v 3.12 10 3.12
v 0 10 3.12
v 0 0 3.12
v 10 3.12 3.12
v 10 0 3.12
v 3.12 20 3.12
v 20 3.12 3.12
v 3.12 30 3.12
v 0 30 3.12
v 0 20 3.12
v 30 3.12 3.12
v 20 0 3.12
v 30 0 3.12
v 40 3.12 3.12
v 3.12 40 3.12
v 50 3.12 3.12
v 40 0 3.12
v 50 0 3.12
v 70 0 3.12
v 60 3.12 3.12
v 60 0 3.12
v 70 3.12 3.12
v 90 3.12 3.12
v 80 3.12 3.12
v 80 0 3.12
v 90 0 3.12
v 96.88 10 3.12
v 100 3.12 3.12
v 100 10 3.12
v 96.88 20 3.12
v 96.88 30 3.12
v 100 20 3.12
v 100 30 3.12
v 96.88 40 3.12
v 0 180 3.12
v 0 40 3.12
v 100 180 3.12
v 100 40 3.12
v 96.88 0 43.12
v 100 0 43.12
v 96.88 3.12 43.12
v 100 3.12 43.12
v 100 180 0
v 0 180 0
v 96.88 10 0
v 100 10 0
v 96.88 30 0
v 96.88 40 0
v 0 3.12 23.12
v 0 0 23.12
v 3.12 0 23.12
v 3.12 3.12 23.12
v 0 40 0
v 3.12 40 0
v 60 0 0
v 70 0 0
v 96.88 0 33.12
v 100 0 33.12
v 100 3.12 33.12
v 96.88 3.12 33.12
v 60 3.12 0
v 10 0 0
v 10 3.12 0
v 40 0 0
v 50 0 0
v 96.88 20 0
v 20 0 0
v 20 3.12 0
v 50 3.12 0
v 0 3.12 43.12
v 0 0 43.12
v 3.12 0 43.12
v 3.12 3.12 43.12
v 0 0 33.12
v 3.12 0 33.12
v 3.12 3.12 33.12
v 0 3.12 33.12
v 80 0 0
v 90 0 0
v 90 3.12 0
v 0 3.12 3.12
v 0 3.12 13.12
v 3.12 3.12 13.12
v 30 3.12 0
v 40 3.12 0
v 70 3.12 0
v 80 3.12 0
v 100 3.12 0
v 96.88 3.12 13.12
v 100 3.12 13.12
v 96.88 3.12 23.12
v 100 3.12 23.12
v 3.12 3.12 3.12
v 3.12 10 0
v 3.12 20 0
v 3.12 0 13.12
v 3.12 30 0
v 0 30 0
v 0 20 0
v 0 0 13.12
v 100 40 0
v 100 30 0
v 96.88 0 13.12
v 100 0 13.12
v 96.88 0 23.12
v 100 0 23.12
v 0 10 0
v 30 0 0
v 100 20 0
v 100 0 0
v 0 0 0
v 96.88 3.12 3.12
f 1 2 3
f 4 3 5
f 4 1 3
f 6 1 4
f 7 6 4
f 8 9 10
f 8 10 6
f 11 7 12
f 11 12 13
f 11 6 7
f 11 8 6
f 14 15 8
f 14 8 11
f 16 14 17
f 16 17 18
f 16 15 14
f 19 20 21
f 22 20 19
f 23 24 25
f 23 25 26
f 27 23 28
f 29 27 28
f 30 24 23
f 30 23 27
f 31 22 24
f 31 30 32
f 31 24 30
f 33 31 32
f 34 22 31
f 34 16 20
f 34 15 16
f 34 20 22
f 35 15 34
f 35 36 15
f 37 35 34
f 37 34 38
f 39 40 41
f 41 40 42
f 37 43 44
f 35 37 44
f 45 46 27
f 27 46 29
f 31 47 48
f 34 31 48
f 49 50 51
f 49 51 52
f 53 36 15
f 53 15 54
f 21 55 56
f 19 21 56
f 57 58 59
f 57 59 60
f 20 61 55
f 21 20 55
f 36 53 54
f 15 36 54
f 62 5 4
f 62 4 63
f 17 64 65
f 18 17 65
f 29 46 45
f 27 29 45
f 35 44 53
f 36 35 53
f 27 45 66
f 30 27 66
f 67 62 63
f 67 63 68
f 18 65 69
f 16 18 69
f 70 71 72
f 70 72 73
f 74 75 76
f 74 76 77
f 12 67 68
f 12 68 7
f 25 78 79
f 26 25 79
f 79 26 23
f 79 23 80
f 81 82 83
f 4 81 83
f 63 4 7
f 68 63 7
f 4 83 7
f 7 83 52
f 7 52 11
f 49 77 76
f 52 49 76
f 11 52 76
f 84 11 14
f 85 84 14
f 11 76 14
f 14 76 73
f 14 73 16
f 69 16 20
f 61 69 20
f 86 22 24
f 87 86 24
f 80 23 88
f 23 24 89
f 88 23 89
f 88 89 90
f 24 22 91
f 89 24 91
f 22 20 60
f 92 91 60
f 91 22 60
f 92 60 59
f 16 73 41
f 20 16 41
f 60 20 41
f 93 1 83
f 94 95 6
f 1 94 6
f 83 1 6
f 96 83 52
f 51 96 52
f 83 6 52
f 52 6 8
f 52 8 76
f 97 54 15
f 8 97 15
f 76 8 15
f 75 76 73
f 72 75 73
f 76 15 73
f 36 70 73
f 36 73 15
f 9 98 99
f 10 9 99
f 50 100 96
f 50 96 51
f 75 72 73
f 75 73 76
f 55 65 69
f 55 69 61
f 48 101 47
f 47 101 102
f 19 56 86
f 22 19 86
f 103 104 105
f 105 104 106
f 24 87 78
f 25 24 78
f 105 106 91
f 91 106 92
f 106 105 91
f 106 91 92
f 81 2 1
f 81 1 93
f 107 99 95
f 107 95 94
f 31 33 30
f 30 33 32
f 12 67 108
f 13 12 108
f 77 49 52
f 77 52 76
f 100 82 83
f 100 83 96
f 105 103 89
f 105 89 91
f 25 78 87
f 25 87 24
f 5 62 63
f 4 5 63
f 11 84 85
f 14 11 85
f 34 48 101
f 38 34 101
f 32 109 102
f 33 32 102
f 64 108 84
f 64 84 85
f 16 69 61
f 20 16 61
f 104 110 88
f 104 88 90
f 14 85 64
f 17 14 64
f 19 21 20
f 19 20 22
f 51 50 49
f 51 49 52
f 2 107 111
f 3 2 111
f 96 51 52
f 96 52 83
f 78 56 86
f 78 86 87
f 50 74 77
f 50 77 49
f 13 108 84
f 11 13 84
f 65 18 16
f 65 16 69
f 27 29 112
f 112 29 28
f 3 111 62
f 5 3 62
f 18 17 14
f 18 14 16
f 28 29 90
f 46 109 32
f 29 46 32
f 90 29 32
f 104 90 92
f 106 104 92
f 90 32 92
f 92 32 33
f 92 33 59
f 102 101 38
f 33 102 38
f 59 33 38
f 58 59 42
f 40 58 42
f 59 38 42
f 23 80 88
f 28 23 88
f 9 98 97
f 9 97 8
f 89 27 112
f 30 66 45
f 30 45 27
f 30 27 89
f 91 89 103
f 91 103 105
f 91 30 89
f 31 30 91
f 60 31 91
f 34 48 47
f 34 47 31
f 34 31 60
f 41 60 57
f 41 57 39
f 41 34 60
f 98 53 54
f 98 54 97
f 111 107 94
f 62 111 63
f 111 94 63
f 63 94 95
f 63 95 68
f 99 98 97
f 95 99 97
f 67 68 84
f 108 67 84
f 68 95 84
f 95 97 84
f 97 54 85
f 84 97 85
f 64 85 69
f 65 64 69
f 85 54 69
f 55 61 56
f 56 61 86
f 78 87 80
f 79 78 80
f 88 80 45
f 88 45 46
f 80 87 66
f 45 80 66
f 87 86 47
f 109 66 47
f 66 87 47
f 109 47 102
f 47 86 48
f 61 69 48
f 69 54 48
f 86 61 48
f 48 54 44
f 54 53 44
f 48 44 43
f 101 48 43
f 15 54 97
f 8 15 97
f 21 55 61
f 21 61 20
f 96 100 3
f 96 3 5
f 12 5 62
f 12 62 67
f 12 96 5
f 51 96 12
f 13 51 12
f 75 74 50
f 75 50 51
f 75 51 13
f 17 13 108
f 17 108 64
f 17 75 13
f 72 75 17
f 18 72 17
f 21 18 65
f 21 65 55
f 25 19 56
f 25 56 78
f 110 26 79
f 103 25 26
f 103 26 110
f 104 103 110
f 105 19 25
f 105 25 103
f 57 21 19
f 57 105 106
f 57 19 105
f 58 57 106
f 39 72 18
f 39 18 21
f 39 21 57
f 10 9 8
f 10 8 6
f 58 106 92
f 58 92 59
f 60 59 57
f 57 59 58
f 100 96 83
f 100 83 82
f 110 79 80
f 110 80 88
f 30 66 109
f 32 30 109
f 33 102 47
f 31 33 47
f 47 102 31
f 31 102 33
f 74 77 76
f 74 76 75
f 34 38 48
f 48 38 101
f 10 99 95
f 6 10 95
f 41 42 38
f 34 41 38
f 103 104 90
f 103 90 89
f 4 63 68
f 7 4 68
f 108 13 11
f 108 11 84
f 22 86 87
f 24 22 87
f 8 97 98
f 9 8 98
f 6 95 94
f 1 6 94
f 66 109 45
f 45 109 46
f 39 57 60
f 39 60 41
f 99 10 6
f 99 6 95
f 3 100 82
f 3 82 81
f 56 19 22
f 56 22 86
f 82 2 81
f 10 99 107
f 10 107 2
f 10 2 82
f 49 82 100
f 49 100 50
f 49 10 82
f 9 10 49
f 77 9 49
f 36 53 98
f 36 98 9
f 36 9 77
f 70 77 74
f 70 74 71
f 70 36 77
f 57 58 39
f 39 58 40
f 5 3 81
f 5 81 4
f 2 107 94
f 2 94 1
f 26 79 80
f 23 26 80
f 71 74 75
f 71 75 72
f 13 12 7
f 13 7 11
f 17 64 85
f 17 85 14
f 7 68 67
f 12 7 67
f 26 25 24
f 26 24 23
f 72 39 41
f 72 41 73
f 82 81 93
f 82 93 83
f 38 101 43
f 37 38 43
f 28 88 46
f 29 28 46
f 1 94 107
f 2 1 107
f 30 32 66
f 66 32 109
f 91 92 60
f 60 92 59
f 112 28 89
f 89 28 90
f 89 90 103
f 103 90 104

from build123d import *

# Parameters (mm, degrees)
BOSS_EXTRUDE1_DEPTH = 3.12
BOSS_EXTRUDE2_DEPTH = 3.12
BOSS_EXTRUDE3_DEPTH = 3.12


with BuildPart() as part:
    # Sketch1 → Boss-Extrude1 (new body)
    with BuildSketch(Plane.XY):
        Polygon((0, 0), (10, 0), (10, 3.12), (20, 3.12), (20, 0), (30, 0), (30, 3.12), (40, 3.12), (40, 0), (50, 0), (50, 3.12), (60, 3.12), (60, 0), (70, 0), (70, 3.12), (80, 3.12), (80, 0), (90, 0), (90, 3.12), (100, 3.12), (100, 10), (96.88, 10), (96.88, 20), (100, 20), (100, 30), (96.88, 30), (96.88, 40), (100, 40), (100, 180), (0, 180), (0, 40), (3.12, 40), (3.12, 30), (0, 30), (0, 20), (3.12, 20), (3.12, 10), (0, 10), align=None)
    extrude(amount=BOSS_EXTRUDE1_DEPTH)


with BuildPart() as body_2:
    # Sketch2 → Boss-Extrude2 (new body)
    with BuildSketch(Plane.XZ):
        Polygon((10, 3.12), (10, 0), (20, 0), (20, 3.12), (30, 3.12), (30, 0), (40, 0), (40, 3.12), (50, 3.12), (50, 0), (60, 0), (60, 3.12), (70, 3.12), (70, 0), (80, 0), (80, 3.12), (90, 3.12), (90, 0), (100, 0), (100, 3.12), (100, 13.12), (96.88, 13.12), (96.88, 23.12), (100, 23.12), (100, 33.12), (96.88, 33.12), (96.88, 43.12), (3.12, 43.12), (3.12, 33.12), (0, 33.12), (0, 23.12), (3.12, 23.12), (3.12, 13.12), (0, 13.12), (0, 3.12), align=None)
    extrude(amount=-BOSS_EXTRUDE2_DEPTH)


with BuildPart() as body_3:
    # Sketch3 → Boss-Extrude3 (new body)
    with BuildSketch(Plane.ZY):
        Polygon((3.12, 40), (0, 40), (0, 30), (3.12, 30), (3.12, 20), (0, 20), (0, 10), (3.12, 10), (3.12, 3.12), (13.12, 3.12), (13.12, 0), (23.12, 0), (23.12, 3.12), (33.12, 3.12), (33.12, 0), (43.12, 0), (43.12, 3.12), align=None)
    extrude(amount=-BOSS_EXTRUDE3_DEPTH)


with BuildPart() as body_4:
    # Mirror1: mirrored copy
    add(body_3.part.mirror(Plane.ZY.offset(-50)))


solid = Compound([part.part, body_2.part, body_3.part, body_4.part])
